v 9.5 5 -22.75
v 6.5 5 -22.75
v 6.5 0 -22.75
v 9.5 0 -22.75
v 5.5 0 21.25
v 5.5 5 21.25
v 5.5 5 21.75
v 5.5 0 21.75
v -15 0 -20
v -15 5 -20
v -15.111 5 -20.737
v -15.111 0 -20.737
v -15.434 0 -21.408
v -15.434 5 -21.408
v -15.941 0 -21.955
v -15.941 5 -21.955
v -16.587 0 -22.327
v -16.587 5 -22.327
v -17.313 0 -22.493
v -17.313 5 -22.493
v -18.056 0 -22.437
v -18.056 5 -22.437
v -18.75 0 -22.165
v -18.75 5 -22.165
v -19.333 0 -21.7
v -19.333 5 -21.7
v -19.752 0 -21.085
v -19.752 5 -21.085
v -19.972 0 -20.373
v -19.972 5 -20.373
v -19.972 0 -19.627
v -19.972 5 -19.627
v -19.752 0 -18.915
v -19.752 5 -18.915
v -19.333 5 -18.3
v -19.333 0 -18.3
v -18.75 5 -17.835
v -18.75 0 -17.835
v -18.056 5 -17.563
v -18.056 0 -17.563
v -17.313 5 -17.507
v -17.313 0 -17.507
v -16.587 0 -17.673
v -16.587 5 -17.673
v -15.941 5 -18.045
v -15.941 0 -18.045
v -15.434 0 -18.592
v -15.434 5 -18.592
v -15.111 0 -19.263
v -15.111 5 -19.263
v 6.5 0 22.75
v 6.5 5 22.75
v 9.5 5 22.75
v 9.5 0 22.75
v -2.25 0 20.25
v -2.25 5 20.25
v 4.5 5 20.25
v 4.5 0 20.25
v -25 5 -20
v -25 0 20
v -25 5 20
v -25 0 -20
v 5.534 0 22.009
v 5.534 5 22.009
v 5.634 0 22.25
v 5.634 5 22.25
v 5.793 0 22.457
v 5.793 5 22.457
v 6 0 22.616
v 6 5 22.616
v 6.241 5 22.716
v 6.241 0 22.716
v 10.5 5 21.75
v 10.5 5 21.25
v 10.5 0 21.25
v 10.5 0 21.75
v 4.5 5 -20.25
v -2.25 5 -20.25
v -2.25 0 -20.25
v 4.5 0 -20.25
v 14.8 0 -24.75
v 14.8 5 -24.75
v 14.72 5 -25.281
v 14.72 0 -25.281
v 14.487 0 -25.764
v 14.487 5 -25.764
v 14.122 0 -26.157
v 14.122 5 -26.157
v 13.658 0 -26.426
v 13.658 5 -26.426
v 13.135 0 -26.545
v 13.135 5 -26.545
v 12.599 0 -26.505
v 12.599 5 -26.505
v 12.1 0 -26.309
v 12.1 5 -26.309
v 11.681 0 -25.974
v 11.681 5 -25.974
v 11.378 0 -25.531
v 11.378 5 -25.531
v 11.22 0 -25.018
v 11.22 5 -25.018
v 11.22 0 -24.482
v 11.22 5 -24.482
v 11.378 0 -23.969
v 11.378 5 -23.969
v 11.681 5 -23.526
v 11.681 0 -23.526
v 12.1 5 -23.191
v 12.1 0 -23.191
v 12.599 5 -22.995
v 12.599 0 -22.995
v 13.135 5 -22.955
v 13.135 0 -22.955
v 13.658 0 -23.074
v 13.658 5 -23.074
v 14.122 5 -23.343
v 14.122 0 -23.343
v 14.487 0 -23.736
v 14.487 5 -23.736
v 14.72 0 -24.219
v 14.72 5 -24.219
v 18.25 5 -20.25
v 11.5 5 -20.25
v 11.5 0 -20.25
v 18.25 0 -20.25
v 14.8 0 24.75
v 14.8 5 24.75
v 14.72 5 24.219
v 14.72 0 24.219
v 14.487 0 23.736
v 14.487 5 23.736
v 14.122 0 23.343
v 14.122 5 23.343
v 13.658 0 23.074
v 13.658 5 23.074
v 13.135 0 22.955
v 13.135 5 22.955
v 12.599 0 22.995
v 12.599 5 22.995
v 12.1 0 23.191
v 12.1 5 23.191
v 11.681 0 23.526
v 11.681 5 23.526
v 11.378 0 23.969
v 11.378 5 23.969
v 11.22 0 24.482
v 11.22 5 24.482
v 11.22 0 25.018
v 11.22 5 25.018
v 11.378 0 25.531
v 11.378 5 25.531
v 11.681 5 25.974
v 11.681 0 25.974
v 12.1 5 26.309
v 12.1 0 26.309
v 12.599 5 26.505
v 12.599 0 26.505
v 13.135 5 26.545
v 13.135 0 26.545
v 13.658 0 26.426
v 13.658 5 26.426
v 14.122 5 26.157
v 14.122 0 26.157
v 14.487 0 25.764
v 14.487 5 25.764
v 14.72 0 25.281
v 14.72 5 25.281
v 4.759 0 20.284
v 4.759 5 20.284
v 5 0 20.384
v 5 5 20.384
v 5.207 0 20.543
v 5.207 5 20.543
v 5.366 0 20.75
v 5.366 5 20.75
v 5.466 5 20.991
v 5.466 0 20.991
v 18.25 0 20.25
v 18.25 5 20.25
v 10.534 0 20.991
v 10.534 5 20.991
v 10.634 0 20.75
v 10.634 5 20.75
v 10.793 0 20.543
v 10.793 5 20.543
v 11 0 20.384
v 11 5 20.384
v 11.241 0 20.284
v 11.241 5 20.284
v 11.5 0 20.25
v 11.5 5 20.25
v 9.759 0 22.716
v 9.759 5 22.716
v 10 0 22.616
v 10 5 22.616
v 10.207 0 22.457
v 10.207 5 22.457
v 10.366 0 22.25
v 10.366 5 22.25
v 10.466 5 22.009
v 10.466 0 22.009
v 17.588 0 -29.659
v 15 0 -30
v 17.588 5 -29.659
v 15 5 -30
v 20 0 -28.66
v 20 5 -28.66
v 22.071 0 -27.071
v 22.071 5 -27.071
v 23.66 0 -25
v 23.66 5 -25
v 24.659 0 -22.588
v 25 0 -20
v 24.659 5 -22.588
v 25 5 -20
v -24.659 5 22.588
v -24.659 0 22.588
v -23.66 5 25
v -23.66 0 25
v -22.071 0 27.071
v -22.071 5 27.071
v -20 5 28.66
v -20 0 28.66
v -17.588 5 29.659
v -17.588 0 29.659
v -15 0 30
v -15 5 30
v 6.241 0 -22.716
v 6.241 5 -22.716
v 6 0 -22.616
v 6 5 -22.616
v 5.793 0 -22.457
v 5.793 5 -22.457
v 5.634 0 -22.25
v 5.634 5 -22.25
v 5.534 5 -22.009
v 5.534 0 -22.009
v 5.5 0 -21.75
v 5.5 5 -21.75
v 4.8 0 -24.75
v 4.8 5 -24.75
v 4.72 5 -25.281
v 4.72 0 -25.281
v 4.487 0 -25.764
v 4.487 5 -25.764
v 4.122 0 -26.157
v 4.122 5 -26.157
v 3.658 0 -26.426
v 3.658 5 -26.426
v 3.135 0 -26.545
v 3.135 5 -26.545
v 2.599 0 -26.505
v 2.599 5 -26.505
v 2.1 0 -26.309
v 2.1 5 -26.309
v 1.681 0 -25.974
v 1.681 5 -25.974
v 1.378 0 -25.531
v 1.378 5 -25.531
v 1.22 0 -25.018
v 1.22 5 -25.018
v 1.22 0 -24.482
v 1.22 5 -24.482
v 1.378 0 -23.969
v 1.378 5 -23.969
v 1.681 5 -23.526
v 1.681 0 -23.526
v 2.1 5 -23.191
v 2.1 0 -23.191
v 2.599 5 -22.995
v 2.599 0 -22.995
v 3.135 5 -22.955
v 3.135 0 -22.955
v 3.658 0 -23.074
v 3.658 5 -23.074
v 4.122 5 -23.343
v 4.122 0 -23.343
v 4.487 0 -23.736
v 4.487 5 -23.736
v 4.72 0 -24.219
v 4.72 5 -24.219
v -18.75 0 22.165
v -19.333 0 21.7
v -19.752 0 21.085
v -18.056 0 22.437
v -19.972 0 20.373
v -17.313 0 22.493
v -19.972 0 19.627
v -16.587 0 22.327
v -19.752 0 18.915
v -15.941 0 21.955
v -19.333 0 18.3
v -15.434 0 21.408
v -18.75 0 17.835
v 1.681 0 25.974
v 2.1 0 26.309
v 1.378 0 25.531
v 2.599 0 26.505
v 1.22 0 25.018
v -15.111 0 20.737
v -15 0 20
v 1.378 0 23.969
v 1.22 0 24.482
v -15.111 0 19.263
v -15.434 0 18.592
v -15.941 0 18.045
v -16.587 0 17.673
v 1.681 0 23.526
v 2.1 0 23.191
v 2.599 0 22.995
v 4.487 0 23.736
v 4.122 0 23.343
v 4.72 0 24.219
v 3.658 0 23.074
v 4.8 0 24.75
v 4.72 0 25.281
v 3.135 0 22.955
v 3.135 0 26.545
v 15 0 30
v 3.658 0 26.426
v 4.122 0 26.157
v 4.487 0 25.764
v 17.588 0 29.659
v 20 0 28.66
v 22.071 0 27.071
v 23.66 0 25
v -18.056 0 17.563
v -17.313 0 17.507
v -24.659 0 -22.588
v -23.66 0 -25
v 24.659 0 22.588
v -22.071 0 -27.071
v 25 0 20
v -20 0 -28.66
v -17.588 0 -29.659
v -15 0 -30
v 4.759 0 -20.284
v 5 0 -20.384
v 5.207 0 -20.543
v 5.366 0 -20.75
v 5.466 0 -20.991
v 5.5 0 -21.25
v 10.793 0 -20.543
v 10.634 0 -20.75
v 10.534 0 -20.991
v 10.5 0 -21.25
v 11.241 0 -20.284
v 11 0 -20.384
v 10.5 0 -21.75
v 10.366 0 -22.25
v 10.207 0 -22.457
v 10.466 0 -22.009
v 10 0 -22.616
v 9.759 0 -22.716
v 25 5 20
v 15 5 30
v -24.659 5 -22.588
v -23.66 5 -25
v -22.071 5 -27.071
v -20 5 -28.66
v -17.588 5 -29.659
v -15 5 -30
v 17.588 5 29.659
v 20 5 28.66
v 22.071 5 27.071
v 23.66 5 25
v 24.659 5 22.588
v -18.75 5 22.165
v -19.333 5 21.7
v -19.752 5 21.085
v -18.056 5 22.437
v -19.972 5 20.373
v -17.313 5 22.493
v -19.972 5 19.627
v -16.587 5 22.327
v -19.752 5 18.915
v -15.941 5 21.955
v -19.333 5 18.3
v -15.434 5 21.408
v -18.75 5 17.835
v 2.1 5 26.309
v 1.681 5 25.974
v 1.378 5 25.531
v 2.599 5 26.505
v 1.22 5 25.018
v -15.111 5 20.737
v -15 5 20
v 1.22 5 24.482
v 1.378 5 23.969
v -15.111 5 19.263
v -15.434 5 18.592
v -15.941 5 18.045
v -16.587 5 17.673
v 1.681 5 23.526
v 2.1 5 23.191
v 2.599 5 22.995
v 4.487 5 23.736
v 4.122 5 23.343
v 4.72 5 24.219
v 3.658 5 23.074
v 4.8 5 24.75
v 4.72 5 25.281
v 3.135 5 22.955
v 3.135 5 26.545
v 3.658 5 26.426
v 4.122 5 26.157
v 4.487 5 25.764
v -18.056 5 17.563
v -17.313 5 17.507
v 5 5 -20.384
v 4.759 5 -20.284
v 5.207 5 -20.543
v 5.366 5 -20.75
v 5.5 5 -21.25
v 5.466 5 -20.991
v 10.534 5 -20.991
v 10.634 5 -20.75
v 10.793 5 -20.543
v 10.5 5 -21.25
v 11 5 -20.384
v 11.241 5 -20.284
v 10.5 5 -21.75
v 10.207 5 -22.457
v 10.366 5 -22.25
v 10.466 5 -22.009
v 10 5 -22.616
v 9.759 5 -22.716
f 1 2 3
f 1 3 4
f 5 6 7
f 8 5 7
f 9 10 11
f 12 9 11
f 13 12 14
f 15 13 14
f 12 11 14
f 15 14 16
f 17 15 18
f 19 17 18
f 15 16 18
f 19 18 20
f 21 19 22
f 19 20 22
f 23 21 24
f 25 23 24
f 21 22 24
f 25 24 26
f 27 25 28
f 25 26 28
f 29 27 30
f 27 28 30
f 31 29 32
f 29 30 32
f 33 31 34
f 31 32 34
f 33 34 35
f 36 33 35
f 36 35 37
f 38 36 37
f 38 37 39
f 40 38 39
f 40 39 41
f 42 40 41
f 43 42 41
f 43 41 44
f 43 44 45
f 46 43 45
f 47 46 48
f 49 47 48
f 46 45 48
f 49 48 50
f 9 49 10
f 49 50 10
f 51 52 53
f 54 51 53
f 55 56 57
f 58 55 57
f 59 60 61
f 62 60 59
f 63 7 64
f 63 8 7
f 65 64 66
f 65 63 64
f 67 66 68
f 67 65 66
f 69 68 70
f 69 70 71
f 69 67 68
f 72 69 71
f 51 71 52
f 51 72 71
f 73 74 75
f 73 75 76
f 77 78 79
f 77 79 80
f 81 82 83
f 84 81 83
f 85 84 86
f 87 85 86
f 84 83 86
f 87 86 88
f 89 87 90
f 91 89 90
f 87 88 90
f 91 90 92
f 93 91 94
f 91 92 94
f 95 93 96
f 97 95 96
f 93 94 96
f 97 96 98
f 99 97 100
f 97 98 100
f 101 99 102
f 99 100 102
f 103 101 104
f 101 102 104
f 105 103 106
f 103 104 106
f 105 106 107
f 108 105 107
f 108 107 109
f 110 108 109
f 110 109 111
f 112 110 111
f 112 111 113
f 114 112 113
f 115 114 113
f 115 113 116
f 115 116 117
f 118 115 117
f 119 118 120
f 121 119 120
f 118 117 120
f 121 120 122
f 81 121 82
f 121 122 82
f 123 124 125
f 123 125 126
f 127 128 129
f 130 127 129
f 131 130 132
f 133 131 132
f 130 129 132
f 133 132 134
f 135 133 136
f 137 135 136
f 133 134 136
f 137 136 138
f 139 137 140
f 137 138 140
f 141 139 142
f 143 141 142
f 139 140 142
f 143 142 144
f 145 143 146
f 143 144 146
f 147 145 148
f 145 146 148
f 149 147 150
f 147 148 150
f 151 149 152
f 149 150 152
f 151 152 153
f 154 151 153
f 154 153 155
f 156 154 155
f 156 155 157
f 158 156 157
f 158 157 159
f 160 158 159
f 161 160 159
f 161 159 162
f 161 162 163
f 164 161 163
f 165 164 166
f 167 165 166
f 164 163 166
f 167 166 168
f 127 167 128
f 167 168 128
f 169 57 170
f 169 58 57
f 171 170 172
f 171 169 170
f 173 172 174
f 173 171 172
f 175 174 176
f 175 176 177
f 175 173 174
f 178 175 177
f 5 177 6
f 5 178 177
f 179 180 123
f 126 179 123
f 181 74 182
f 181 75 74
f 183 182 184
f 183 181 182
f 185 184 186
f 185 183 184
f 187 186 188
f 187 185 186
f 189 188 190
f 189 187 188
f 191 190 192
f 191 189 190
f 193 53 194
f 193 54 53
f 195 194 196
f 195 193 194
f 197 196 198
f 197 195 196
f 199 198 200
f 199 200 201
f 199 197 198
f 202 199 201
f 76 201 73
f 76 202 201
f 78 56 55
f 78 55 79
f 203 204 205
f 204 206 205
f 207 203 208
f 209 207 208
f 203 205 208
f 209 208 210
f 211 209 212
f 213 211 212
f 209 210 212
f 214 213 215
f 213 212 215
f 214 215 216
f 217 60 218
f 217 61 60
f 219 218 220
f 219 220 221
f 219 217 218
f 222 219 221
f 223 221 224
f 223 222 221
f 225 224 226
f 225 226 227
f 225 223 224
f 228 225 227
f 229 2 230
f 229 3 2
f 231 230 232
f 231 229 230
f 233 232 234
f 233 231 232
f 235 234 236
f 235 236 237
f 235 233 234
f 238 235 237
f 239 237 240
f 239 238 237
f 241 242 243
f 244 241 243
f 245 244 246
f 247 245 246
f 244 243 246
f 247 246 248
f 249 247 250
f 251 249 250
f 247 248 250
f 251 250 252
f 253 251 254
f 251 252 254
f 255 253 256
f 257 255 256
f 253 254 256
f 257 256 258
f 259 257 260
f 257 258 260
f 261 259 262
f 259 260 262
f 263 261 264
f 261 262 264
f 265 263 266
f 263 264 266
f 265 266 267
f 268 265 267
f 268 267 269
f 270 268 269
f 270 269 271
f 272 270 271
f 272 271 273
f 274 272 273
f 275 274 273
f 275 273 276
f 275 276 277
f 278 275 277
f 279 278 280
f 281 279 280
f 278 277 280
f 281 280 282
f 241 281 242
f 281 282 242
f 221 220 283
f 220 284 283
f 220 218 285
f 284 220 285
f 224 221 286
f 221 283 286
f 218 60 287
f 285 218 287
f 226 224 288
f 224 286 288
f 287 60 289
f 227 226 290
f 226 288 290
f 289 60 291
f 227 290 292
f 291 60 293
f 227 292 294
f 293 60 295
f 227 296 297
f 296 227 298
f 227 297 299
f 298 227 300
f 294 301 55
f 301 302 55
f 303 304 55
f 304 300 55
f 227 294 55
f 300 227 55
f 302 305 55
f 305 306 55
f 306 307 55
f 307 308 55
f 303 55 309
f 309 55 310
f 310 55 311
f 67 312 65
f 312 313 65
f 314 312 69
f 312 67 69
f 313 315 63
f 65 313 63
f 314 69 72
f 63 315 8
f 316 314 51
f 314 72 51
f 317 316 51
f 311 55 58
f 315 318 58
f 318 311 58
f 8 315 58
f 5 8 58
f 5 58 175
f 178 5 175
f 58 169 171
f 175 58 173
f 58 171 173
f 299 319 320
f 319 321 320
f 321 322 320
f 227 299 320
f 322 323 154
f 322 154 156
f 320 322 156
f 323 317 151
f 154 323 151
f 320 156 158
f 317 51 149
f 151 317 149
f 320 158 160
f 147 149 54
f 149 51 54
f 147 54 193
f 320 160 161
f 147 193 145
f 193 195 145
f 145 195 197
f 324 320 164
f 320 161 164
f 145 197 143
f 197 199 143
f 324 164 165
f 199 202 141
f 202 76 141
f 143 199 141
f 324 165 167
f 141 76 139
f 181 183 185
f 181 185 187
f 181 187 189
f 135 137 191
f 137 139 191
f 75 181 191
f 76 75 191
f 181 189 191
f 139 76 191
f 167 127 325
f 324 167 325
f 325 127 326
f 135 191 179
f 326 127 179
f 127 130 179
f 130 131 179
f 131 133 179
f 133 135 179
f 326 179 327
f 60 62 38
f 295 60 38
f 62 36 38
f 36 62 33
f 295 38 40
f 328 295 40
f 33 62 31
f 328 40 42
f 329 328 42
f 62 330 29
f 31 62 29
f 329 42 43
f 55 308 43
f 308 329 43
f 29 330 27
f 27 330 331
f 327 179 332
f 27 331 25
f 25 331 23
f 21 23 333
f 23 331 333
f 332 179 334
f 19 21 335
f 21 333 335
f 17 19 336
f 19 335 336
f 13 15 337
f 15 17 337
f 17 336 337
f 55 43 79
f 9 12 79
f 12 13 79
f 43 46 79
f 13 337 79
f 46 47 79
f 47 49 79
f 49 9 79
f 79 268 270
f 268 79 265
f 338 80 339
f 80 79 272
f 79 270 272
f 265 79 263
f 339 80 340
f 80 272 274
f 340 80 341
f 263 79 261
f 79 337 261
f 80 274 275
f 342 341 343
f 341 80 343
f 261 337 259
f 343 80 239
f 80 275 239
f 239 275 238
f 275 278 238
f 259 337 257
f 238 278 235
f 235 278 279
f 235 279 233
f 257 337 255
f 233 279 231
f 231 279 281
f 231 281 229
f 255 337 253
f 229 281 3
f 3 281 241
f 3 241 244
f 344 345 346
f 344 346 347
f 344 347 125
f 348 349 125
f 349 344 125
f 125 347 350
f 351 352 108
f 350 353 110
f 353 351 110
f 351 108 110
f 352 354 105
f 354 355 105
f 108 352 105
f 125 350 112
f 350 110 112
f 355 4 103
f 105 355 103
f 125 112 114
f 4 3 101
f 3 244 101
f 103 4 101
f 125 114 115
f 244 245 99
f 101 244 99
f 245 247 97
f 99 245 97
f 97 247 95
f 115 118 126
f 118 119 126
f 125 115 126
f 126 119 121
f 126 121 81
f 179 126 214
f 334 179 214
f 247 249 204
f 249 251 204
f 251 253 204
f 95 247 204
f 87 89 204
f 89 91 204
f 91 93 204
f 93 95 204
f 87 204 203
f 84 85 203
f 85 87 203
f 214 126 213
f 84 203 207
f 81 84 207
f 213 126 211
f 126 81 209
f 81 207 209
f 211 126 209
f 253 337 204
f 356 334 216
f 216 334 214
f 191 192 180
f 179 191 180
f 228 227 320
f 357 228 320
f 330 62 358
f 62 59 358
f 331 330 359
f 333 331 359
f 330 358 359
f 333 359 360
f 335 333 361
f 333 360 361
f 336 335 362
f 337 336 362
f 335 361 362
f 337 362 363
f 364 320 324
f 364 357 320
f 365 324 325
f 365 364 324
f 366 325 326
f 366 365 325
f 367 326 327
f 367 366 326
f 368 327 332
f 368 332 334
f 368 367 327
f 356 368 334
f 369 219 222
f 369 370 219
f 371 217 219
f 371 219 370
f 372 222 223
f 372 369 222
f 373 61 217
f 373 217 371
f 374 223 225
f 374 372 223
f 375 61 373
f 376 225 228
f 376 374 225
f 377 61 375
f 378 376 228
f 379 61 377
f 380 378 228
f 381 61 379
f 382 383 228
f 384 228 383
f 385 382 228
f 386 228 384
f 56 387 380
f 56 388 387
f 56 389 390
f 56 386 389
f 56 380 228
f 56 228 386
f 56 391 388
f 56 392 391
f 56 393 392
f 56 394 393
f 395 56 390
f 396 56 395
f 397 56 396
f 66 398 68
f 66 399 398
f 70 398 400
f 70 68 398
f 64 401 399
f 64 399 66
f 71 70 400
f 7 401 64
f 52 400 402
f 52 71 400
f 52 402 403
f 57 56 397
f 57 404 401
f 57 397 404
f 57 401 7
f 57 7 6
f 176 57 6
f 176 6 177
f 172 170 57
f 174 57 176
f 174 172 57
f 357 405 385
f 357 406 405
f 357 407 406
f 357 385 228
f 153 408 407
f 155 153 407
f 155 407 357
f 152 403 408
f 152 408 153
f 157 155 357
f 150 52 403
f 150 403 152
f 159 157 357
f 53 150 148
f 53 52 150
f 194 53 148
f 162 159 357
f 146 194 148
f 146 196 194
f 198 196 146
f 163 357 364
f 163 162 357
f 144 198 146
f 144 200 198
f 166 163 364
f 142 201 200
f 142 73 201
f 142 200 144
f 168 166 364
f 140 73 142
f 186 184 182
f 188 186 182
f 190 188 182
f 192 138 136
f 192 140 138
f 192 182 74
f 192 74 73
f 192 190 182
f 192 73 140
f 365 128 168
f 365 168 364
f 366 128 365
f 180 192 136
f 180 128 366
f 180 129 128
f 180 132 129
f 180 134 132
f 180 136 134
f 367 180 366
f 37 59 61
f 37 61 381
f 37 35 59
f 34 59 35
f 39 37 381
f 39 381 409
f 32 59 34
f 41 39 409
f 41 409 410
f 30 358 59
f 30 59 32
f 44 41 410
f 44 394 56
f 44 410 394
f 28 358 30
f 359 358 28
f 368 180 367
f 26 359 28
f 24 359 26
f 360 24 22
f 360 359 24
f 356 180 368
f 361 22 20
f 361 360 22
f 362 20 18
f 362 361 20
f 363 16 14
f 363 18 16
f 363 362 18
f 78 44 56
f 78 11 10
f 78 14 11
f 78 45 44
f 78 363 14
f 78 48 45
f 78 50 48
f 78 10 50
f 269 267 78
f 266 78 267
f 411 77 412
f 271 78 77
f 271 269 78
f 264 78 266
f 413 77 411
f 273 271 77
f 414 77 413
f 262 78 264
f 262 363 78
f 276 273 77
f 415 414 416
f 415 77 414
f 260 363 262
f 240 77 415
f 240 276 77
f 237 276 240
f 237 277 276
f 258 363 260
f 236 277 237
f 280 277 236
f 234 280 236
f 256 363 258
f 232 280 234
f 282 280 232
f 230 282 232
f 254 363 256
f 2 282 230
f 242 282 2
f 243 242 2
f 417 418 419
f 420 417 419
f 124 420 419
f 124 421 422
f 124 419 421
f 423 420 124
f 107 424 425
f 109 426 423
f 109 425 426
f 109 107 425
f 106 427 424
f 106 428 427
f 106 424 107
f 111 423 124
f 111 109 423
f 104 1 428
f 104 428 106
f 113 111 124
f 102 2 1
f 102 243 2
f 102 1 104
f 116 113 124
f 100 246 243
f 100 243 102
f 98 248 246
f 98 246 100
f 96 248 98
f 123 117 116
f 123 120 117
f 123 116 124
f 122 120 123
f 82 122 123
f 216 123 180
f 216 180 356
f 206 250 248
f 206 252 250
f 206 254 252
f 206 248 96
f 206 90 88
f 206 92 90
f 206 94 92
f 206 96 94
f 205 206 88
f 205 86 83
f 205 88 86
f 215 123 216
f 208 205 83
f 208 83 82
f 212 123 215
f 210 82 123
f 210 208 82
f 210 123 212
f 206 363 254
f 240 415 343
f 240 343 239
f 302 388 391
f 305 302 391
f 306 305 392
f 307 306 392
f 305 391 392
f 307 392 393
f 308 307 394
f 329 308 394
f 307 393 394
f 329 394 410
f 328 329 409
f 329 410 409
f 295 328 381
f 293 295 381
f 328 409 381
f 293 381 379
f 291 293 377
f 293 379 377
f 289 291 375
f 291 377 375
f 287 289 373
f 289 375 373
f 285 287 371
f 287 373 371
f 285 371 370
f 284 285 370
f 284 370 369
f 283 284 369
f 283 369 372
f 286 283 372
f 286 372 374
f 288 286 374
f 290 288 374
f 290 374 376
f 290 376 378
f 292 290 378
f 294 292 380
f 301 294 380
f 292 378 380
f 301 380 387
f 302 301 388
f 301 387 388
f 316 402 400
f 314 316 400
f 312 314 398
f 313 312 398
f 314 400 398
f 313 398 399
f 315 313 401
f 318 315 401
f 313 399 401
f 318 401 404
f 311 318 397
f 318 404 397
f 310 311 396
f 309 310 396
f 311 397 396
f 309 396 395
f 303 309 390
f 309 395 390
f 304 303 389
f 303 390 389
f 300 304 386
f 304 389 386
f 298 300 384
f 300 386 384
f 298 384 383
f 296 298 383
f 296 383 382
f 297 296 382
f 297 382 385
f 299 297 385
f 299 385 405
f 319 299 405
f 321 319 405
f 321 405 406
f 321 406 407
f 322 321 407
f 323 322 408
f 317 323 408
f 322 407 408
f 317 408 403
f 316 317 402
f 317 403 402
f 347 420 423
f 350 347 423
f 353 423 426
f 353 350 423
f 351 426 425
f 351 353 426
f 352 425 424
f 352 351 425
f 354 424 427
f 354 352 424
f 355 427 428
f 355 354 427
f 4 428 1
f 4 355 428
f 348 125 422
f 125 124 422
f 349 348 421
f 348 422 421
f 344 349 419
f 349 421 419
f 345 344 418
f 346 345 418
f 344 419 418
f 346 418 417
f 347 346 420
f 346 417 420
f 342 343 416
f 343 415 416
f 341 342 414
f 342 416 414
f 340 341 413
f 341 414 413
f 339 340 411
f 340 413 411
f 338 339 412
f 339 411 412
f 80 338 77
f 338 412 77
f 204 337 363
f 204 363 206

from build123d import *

# Parameters (mm, degrees)
SKETCH1_W           = 50
SKETCH1_H           = 60
BOSS_EXTRUDE1_DEPTH = 5
SKETCH2_W           = 20.5
SKETCH2_H           = 40.5
CUT_EXTRUDE1_DEPTH  = 5
SKETCH3_R           = 1.8
CUT_EXTRUDE2_DEPTH  = 5
SKETCH4_R           = 2.5
CUT_EXTRUDE3_DEPTH  = 5
FILLET1_R           = 10
SKETCH5_W           = 5
SKETCH5_H           = 5
CUT_EXTRUDE4_DEPTH  = 10
FILLET2_R           = 1


with BuildPart() as part:
    # Sketch1 → Boss-Extrude1 (new body)
    with BuildSketch(Plane(origin=(0, 0, 0), x_dir=(1, 0, 0), z_dir=(0, 1, 0))):
        Rectangle(SKETCH1_W, SKETCH1_H)
    extrude(amount=BOSS_EXTRUDE1_DEPTH)

    # Sketch2 → Cut-Extrude1 (cut)
    with BuildSketch(Plane(origin=(0, 5, 0), x_dir=(1, 0, 0), z_dir=(0, 1, 0))):
        with Locations((8, 0)):
            Rectangle(SKETCH2_W, SKETCH2_H)
    extrude(amount=-CUT_EXTRUDE1_DEPTH, mode=Mode.SUBTRACT)

    # Sketch3 → Cut-Extrude2 (cut)
    with BuildSketch(Plane(origin=(0, 5, 0), x_dir=(1, 0, 0), z_dir=(0, 1, 0))):
        with Locations((3, 24.75)):
            Circle(SKETCH3_R)
        with Locations((13, 24.75)):
            Circle(SKETCH3_R)
        with Locations((13, -24.75)):
            Circle(SKETCH3_R)
        with Locations((3, -24.75)):
            Circle(SKETCH3_R)
    extrude(amount=-CUT_EXTRUDE2_DEPTH, mode=Mode.SUBTRACT)

    # Sketch4 → Cut-Extrude3 (cut)
    with BuildSketch(Plane(origin=(0, 5, 0), x_dir=(1, 0, 0), z_dir=(0, 1, 0))):
        with Locations((-17.5, 20)):
            Circle(SKETCH4_R)
        with Locations((-17.5, -20)):
            Circle(SKETCH4_R)
    extrude(amount=-CUT_EXTRUDE3_DEPTH, mode=Mode.SUBTRACT)

    # Fillet1
    fillet1_edges = [part.edges().sort_by_distance(p)[0] for p in [
        (-25, 2.5, -30),
        (25, 2.5, -30),
        (25, 2.5, 30),
        (-25, 2.5, 30),
    ]]
    fillet(fillet1_edges, radius=FILLET1_R)

    # Sketch5 → Cut-Extrude4 (cut)
    with BuildSketch(Plane(origin=(0, 5, 0), x_dir=(1, 0, 0), z_dir=(0, 1, 0))):
        with Locations((8, 20.25)):
            Rectangle(SKETCH5_W, SKETCH5_H)
    cut_extrude4 = extrude(amount=-CUT_EXTRUDE4_DEPTH, mode=Mode.SUBTRACT)

    # Mirror1: Cut-Extrude4 across plane
    add(cut_extrude4.mirror(Plane.XY), mode=Mode.SUBTRACT)

    # Fillet2
    fillet2_edges = [part.edges().sort_by_distance(p)[0] for p in [
        (10.5, 2.5, 20.25),
        (5.5, 2.5, 20.25),
        (10.5, 2.5, 22.75),
        (5.5, 2.5, 22.75),
        (10.5, 2.5, -20.25),
        (5.5, 2.5, -20.25),
        (5.5, 2.5, -22.75),
        (10.5, 2.5, -22.75),
    ]]
    fillet(fillet2_edges, radius=FILLET2_R)


solid = part.part
